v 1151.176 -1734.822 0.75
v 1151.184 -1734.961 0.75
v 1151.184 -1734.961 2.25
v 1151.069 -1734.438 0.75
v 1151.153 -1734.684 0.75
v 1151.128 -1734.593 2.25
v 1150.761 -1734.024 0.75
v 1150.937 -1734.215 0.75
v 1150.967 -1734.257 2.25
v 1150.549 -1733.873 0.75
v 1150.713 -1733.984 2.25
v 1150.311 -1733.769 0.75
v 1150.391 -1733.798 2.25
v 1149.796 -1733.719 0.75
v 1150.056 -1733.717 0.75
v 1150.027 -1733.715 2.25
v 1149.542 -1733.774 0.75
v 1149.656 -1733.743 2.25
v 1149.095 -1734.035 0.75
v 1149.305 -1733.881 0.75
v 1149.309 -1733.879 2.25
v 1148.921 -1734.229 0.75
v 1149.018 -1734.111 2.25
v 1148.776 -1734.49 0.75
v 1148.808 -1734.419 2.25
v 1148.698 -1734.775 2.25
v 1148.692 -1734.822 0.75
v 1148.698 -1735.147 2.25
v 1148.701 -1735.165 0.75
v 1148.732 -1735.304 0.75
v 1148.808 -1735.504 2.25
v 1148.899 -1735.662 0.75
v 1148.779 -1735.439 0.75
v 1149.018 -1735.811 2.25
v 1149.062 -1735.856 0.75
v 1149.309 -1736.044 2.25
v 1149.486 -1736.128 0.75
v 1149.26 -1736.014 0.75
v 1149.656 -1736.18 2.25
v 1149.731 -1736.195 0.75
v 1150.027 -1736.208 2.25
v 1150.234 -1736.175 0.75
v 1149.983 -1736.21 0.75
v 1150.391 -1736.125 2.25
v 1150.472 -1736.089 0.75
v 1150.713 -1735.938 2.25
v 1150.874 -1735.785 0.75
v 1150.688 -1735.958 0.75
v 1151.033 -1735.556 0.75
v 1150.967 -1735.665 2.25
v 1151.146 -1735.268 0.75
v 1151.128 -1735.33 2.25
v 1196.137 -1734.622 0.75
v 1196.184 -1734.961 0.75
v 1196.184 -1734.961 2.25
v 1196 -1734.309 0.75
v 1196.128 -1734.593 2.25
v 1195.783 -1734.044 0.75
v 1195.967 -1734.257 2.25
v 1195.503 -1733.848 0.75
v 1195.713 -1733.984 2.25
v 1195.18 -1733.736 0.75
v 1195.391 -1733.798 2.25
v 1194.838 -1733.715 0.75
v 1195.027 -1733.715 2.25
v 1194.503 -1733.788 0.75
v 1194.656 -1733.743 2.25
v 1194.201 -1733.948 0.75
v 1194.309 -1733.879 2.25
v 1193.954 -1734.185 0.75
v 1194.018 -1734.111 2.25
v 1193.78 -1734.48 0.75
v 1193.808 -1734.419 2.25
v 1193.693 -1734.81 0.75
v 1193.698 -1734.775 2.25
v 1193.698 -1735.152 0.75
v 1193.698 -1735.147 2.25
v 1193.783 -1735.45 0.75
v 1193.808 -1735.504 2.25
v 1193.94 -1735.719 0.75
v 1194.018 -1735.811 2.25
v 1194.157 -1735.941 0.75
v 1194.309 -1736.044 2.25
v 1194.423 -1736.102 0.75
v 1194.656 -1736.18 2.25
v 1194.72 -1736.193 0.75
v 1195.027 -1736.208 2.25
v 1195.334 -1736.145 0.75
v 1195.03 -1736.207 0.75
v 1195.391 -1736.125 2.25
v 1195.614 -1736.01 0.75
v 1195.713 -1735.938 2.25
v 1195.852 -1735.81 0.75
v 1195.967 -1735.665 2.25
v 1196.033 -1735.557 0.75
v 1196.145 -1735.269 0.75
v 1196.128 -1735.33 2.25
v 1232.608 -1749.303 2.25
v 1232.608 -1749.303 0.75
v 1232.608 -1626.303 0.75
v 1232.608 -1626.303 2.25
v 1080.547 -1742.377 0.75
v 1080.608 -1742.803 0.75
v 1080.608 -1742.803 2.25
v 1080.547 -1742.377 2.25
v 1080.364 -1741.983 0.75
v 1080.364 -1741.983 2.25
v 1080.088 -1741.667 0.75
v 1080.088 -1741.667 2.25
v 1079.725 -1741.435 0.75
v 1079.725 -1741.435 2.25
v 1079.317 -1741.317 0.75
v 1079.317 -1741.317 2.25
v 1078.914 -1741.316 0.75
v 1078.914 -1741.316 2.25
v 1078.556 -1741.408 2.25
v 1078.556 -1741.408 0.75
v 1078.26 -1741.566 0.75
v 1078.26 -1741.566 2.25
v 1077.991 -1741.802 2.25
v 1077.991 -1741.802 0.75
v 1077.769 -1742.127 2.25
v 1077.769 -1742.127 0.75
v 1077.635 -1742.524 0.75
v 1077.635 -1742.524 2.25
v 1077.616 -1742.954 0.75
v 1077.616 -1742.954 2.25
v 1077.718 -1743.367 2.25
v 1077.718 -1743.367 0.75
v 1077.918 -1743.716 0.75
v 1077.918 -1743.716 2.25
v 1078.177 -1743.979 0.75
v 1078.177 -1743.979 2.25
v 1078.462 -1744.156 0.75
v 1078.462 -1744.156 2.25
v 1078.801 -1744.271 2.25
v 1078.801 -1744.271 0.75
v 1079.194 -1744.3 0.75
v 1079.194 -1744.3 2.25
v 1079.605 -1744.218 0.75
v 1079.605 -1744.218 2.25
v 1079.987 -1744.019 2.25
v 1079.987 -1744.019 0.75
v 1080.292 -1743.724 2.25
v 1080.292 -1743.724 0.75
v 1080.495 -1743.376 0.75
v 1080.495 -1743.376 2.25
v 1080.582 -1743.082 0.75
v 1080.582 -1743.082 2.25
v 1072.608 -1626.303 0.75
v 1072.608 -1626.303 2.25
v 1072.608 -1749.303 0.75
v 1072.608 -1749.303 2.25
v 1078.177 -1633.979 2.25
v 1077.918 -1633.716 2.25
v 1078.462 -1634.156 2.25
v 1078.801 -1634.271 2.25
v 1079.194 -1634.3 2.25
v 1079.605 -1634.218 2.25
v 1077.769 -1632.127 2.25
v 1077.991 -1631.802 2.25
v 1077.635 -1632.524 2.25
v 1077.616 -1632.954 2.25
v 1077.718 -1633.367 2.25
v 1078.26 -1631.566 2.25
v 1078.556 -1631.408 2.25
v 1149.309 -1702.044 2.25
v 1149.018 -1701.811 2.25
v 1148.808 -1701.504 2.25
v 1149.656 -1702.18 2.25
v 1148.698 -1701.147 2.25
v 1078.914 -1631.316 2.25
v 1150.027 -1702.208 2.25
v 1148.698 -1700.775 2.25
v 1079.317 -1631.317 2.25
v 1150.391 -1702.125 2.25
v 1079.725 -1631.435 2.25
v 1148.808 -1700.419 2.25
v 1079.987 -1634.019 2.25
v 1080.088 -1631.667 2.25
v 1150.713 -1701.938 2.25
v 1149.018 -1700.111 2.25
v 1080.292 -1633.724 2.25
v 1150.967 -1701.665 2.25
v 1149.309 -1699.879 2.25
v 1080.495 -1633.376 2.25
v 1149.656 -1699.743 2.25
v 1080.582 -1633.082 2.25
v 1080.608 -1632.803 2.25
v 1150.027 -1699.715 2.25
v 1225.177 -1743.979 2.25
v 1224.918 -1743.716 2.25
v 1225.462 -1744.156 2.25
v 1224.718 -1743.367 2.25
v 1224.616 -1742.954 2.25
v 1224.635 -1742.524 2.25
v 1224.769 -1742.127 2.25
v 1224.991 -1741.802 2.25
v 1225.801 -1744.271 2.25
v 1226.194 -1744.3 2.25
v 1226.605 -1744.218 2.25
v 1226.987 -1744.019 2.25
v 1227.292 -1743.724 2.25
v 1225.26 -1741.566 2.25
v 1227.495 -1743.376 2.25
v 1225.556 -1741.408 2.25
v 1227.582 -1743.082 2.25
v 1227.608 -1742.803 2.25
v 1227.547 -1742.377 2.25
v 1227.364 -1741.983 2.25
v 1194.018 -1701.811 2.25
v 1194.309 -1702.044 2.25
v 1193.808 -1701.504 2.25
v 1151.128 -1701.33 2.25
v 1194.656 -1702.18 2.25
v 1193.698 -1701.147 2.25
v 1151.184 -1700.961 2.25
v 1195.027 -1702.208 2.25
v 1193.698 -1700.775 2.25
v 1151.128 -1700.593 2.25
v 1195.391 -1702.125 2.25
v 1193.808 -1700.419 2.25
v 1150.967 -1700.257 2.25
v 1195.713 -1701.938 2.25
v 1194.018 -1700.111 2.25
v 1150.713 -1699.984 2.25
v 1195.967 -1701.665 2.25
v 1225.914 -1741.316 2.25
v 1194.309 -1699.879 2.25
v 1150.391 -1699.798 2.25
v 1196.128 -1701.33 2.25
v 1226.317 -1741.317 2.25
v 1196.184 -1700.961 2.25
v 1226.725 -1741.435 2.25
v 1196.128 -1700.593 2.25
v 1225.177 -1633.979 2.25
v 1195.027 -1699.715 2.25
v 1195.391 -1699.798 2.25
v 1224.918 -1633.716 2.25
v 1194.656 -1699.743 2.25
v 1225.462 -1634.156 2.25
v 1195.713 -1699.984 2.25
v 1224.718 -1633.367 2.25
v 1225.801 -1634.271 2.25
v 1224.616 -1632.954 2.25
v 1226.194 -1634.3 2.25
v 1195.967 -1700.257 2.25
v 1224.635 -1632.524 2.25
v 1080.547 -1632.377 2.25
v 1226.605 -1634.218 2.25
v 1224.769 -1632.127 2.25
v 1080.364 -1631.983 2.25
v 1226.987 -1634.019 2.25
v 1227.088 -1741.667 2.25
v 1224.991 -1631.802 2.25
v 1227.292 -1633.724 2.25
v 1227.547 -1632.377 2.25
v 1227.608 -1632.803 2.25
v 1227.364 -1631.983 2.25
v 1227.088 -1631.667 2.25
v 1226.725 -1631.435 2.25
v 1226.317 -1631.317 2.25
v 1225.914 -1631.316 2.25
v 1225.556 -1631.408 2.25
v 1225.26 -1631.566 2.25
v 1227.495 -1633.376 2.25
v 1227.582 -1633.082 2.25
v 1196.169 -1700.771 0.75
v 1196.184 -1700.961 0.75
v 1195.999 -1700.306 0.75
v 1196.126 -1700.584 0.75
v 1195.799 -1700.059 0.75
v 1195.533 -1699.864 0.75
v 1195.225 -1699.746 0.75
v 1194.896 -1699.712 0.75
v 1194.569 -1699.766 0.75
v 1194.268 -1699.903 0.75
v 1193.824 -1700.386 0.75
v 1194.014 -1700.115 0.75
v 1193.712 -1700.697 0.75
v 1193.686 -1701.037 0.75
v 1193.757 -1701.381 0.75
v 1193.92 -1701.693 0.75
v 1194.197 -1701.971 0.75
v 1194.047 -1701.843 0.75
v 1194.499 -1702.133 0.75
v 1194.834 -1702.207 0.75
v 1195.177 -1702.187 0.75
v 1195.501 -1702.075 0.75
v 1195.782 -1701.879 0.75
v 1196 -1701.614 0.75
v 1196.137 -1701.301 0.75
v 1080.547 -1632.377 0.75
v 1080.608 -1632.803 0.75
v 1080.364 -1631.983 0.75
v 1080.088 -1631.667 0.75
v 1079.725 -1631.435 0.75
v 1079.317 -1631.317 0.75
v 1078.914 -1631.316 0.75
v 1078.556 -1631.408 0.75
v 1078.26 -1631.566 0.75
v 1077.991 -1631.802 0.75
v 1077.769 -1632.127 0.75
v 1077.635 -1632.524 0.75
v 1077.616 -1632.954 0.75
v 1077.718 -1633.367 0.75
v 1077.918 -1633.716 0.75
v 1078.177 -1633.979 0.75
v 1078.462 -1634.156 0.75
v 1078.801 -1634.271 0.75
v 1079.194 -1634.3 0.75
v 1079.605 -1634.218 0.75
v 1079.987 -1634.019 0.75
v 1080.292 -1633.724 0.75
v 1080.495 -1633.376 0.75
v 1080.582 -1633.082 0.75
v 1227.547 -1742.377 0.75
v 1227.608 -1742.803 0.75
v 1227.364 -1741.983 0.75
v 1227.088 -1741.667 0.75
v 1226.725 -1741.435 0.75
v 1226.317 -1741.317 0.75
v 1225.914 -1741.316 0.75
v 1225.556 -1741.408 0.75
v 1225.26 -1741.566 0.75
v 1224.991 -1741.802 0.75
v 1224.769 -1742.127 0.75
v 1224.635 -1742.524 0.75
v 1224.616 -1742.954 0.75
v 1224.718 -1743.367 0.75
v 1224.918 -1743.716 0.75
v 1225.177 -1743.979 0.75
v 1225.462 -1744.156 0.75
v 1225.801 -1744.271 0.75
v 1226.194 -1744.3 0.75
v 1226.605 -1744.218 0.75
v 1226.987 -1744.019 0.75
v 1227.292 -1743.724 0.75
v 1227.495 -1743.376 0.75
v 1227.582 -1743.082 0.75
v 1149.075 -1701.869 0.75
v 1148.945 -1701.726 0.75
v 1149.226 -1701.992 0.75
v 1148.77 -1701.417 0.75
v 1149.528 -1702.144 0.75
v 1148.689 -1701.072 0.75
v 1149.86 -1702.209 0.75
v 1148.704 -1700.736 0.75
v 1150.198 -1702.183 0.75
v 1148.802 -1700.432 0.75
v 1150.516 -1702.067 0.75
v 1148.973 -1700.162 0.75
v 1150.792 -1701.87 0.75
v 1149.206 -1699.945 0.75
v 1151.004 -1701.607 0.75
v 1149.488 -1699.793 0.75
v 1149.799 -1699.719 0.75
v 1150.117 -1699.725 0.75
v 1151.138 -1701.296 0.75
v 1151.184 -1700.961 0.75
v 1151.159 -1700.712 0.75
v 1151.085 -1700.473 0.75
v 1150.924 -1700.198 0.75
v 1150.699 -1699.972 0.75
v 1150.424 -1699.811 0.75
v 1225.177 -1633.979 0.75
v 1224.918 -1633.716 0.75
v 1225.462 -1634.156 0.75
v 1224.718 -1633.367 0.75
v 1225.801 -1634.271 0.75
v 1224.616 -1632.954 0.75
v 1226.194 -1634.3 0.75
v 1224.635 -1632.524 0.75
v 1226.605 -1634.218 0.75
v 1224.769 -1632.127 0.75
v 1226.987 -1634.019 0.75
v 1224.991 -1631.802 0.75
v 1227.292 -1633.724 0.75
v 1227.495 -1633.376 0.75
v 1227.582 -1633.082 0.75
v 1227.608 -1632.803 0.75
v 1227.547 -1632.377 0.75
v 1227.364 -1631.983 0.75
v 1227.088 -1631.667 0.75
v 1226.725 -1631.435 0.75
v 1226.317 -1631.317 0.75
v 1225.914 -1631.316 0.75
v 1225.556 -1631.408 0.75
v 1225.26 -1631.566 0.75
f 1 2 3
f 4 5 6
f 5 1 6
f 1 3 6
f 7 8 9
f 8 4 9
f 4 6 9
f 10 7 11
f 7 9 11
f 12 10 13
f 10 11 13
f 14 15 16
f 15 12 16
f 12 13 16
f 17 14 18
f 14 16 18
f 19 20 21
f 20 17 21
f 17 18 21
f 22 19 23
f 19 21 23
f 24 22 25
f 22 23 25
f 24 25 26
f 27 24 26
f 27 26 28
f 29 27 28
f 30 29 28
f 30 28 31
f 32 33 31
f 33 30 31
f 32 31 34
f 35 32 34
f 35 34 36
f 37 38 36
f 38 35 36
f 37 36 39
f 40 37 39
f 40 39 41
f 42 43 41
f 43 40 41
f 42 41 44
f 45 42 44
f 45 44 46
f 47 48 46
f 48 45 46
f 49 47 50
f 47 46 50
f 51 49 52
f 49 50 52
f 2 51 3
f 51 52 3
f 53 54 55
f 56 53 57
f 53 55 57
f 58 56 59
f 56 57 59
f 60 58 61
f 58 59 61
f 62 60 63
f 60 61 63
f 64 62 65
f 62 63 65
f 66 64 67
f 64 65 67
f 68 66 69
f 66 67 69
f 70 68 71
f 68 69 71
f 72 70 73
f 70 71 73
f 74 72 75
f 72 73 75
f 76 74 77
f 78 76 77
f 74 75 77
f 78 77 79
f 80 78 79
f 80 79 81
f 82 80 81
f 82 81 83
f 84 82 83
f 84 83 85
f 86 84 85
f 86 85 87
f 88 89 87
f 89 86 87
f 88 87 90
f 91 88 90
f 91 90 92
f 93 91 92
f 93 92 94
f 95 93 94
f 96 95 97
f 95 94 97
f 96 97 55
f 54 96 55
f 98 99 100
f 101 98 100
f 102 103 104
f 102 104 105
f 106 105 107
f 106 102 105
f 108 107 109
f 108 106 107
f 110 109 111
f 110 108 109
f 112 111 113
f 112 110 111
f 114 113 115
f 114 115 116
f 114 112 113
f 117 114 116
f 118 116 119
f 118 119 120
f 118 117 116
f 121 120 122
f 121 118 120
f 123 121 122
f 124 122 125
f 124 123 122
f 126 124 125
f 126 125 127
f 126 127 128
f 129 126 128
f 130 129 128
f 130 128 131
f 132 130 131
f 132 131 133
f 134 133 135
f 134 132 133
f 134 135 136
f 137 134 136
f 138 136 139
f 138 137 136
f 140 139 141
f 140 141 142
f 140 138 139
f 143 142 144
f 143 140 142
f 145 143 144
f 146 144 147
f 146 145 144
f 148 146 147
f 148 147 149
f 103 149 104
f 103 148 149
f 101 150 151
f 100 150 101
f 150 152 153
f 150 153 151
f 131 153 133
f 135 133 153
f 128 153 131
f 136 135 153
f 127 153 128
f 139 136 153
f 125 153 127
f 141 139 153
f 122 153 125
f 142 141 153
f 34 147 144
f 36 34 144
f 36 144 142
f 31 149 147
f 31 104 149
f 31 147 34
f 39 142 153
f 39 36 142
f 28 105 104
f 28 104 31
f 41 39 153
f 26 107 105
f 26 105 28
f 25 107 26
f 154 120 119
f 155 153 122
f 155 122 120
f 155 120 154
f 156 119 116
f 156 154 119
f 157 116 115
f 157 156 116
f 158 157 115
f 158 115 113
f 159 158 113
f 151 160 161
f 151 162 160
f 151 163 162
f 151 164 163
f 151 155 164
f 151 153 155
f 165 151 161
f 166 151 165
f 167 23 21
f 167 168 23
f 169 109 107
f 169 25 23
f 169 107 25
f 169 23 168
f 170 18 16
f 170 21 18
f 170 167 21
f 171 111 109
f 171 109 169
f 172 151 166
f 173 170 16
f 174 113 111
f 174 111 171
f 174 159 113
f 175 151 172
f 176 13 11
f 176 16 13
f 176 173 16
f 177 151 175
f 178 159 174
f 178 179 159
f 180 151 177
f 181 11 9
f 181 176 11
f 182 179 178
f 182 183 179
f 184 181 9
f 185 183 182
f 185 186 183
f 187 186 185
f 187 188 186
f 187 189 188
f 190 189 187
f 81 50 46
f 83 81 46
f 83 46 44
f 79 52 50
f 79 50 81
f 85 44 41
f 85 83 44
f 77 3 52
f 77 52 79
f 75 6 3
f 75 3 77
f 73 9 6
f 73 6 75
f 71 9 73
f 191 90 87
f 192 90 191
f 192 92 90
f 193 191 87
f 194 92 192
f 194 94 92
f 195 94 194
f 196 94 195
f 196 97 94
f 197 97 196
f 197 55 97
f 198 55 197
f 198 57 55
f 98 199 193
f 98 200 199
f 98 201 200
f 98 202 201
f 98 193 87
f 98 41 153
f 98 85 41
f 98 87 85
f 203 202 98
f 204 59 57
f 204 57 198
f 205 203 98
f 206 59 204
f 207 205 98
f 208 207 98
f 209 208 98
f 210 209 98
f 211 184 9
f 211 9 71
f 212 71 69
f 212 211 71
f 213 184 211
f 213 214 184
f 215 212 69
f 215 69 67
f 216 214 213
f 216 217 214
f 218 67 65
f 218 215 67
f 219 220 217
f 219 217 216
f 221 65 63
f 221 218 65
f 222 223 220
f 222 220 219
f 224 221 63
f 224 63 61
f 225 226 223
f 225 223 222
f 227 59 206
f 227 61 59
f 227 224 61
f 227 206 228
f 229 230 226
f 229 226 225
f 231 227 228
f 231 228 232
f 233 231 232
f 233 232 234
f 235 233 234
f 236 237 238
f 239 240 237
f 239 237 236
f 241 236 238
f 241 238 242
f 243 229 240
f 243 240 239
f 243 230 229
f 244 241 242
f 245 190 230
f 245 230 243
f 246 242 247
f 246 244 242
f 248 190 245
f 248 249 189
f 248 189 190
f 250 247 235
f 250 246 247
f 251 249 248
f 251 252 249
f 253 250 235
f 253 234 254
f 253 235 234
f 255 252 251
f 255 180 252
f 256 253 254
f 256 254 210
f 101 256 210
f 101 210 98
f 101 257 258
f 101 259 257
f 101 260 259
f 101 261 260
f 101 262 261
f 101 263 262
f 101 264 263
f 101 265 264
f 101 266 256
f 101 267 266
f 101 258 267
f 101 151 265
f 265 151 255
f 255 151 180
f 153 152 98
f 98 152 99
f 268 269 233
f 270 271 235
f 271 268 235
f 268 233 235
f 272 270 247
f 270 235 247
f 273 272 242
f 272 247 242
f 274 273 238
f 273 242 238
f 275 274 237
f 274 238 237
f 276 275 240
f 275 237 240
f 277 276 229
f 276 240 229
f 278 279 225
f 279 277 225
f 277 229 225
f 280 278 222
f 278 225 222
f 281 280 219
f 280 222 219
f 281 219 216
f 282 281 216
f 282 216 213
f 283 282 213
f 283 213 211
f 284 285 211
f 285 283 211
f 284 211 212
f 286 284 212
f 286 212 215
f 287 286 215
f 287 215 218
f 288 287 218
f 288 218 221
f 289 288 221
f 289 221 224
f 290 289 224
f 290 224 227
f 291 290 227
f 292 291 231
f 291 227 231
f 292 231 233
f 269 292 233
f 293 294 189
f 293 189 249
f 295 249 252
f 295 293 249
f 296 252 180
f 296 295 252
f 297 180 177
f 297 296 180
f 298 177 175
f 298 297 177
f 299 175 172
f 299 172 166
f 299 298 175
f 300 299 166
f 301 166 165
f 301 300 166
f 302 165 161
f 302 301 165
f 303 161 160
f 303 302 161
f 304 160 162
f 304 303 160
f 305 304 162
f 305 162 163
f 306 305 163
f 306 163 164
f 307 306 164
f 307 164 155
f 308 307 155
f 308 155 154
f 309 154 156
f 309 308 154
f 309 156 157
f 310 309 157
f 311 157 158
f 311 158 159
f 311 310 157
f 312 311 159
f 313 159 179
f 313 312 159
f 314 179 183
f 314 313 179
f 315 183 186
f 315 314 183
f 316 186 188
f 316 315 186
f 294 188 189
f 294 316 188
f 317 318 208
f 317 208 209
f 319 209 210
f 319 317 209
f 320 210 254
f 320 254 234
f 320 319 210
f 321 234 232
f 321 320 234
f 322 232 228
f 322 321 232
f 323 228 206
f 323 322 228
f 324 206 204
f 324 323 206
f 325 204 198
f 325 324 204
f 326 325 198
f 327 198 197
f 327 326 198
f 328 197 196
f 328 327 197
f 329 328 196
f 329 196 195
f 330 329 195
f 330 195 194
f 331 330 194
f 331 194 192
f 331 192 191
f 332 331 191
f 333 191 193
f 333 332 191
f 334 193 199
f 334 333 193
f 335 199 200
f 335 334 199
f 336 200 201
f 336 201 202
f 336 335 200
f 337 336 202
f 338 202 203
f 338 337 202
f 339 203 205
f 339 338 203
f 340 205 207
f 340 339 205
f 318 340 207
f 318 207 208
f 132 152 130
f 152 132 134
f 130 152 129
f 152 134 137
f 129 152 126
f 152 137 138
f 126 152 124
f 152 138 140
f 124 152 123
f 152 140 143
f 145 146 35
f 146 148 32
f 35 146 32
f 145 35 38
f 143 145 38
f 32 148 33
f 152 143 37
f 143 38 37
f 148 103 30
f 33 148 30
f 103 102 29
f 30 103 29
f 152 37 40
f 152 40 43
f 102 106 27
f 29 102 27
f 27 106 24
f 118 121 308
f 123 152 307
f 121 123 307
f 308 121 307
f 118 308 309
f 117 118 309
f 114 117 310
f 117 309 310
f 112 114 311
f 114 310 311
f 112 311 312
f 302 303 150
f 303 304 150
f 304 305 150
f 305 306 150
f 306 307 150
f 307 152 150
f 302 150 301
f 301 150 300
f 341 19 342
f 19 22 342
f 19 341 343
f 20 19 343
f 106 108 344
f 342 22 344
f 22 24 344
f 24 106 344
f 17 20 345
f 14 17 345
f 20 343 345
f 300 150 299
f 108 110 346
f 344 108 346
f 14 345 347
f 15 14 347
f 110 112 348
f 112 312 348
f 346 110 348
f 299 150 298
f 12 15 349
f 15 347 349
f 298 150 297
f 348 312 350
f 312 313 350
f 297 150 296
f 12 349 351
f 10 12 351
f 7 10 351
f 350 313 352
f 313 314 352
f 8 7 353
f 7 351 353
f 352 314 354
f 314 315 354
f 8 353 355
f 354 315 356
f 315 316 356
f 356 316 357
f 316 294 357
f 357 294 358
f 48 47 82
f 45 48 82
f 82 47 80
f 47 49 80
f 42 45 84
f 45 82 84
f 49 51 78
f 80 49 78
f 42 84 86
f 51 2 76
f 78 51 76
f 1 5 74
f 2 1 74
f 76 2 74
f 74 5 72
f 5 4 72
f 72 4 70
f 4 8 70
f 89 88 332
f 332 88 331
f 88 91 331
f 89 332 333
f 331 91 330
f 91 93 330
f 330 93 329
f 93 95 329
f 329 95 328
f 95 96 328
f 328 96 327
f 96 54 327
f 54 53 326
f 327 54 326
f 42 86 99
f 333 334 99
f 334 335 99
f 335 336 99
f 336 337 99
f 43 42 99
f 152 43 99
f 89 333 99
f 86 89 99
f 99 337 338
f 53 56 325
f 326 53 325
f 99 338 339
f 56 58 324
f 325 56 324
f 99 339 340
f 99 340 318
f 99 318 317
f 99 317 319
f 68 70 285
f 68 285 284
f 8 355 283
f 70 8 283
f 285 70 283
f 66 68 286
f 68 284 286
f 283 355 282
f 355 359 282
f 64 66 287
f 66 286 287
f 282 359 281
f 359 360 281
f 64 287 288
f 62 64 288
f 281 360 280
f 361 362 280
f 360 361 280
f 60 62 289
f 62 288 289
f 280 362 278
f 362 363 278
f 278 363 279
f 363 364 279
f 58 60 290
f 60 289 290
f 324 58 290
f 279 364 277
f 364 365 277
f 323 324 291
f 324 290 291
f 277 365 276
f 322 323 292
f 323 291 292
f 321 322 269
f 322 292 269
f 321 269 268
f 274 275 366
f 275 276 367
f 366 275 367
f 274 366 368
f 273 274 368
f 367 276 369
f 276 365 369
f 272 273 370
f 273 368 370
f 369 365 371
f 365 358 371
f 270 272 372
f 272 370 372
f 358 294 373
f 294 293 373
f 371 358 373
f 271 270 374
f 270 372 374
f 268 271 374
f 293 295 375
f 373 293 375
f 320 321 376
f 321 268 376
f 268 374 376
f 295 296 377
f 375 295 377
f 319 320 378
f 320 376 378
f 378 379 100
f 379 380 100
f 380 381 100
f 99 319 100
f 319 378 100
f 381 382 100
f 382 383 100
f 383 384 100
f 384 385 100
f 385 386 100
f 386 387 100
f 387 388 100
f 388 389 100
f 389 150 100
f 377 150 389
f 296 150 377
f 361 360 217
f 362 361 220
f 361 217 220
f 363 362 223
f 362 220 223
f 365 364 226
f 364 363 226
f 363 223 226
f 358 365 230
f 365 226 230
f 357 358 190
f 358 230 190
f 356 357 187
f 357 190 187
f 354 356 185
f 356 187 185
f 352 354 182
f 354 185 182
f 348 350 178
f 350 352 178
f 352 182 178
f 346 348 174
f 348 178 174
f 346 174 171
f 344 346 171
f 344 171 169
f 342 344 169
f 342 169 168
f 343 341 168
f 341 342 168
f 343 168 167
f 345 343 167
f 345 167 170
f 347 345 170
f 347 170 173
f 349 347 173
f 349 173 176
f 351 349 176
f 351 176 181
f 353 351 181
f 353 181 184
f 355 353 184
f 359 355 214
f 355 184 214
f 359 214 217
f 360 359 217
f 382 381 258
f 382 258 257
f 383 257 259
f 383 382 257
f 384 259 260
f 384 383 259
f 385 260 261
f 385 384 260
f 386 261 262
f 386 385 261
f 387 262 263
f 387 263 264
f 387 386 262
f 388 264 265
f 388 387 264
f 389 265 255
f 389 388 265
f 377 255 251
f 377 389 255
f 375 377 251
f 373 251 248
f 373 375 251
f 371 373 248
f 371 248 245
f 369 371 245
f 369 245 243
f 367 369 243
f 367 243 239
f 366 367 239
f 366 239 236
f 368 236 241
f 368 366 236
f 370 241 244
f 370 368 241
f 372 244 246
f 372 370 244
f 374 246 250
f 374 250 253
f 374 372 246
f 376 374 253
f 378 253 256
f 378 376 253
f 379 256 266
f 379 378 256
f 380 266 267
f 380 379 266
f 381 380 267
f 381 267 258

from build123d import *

# Parameters (mm, degrees)
SKETCH_1_W               = 1600
SKETCH_1_H               = 1230
SKETCH_1_R               = 15
EXTRUDE_1_DEPTH          = 3
SCALE_1_SCALE_X          = 0.1
SCALE_1_SCALE_Y          = 0.1
SCALE_1_SCALE_Z          = 0.5
SKETCH_2_R               = 1.25
CUT_EXTRUDE_4_DEPTH      = 1.0000001
CUT_EXTRUDE_4_DEPTH_BACK = 2.5000001


with BuildPart() as part:
    # 草图1 → 凸台-拉伸1 (new body)
    with BuildSketch(Plane.XY):
        with Locations((1152.60835314, -1687.80288964)):
            Rectangle(SKETCH_1_W, SKETCH_1_H)
        with Locations((417.60835314, -1137.80288964)):
            Circle(SKETCH_1_R, mode=Mode.SUBTRACT)
        with Locations((1887.60835314, -1137.80288964)):
            Circle(SKETCH_1_R, mode=Mode.SUBTRACT)
        with Locations((1887.60835314, -2237.80288964)):
            Circle(SKETCH_1_R, mode=Mode.SUBTRACT)
        with Locations((417.60835314, -2237.80288964)):
            Circle(SKETCH_1_R, mode=Mode.SUBTRACT)
    extrude(amount=EXTRUDE_1_DEPTH)


with BuildPart() as part_1:
    # 缩放比例1: scaled about (1152.60835314, -1687.80288964, 1.5)
    add(part.part.scale((SCALE_1_SCALE_X, SCALE_1_SCALE_Y, SCALE_1_SCALE_Z), about=(1152.60835314, -1687.80288964, 1.5)))

    # 草图2 → 切除-拉伸4 (cut, two sides)
    with BuildSketch(Plane.XY.offset(2.25)) as cut_extrude_4_sk:
        with Locations((1149.93385314, -1700.96117964)):
            Circle(SKETCH_2_R)
        with Locations((1194.93385314, -1700.96117964)):
            Circle(SKETCH_2_R)
        with Locations((1149.93385314, -1734.96117964)):
            Circle(SKETCH_2_R)
        with Locations((1194.93385314, -1734.96117964)):
            Circle(SKETCH_2_R)
    extrude(amount=CUT_EXTRUDE_4_DEPTH, mode=Mode.SUBTRACT)
    extrude(cut_extrude_4_sk.sketch, amount=-CUT_EXTRUDE_4_DEPTH_BACK, mode=Mode.SUBTRACT)


solid = part_1.part
